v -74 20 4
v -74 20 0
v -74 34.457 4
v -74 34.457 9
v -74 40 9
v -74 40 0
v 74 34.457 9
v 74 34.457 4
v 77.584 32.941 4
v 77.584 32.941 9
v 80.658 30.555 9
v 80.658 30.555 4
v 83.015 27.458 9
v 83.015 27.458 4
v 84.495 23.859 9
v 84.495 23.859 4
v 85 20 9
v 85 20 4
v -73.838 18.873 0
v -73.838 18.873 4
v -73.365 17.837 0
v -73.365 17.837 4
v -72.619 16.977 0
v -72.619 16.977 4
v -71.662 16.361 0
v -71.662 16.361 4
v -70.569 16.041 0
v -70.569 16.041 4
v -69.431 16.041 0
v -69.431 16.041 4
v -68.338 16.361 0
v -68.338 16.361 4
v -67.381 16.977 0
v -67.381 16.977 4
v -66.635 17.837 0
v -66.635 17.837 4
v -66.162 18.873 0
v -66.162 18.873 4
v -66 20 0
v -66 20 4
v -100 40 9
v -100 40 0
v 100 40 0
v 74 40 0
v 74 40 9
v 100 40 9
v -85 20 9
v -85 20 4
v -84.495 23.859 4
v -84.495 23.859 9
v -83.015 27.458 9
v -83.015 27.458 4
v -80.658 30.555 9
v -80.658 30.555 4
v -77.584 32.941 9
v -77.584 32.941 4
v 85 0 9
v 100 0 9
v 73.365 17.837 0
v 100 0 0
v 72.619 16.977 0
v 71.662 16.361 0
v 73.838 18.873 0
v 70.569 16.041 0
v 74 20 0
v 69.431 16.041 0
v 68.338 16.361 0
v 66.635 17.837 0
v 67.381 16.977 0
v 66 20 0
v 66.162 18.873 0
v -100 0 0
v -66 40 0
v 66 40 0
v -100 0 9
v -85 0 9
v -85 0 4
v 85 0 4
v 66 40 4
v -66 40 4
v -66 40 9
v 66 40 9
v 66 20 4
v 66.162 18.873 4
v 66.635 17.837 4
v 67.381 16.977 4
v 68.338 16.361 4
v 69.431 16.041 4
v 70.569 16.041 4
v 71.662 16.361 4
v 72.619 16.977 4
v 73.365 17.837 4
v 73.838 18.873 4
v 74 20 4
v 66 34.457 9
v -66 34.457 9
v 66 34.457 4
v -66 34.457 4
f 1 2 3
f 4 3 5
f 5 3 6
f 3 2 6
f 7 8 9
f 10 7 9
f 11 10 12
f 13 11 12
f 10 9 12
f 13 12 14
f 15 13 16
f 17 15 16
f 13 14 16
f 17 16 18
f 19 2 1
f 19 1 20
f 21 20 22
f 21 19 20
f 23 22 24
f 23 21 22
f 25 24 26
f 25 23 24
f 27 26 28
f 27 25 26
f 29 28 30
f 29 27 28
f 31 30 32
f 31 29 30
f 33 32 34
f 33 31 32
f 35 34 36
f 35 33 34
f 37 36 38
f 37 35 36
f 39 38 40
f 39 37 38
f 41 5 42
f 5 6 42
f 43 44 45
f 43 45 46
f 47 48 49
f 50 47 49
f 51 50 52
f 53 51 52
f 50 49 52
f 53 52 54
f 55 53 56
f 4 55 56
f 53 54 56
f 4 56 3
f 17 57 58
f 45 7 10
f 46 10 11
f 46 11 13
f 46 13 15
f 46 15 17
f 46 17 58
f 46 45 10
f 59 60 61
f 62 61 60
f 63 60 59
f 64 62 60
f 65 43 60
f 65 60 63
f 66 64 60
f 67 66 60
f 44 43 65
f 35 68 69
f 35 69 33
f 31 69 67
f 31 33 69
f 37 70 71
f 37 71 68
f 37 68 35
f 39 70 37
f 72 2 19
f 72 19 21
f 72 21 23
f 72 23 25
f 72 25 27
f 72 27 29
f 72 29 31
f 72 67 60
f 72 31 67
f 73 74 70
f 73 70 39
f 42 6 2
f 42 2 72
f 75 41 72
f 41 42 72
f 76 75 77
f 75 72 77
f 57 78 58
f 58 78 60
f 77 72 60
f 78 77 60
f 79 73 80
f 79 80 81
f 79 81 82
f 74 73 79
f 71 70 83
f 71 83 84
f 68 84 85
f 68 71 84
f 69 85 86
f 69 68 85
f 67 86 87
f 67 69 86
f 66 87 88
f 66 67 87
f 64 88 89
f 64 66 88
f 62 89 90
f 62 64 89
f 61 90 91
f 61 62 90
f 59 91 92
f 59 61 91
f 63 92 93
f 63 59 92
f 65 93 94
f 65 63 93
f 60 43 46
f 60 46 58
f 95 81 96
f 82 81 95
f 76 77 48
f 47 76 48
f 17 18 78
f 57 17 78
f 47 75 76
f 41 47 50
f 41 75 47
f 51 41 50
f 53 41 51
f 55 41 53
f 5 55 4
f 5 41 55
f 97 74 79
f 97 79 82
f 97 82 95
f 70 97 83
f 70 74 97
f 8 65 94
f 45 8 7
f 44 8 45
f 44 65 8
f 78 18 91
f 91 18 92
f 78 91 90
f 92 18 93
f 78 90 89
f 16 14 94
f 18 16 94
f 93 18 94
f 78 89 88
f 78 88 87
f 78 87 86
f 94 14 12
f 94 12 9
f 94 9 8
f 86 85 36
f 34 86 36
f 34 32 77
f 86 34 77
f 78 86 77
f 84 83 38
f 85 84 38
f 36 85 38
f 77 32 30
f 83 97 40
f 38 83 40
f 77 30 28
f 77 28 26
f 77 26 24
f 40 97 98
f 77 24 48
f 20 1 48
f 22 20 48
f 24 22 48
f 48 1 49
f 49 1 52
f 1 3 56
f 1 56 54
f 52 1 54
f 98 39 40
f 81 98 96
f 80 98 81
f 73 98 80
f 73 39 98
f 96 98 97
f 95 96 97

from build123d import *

# Parameters (mm, degrees)
EXTRUDE_1_DEPTH = 4
SKETCH_2_W      = 132
SKETCH_2_H      = 5.543167705
EXTRUDE_2_DEPTH = 5


with BuildPart() as part:
    # 스케치1 → 보스-돌출1 (new body)
    with BuildSketch(Plane.XY):
        with BuildLine():
            Line((100, 0), (-100, 0))
            Line((-100, 0), (-100, 40))
            Line((-100, 40), (-74, 40))
            Line((-74, 40), (-74, 20))
            ThreePointArc((-74, 20), (-70, 16), (-66, 20))
            Line((-66, 20), (-66, 40))
            Line((-66, 40), (66, 40))
            Line((66, 40), (66, 20))
            ThreePointArc((66, 20), (70, 16), (74, 20))
            Line((74, 20), (74, 40))
            Line((74, 40), (100, 40))
            Line((100, 40), (100, 0))
        make_face()
    extrude(amount=EXTRUDE_1_DEPTH)

    # 스케치2 → 보스-돌출2 (add)
    with BuildSketch(Plane.XY.offset(4)):
        with BuildLine():
            Line((-74, 34.456832295), (-74, 40))
            Line((-74, 40), (-100, 40))
            Line((-100, 40), (-100, 0))
            Line((-100, 0), (-85, 0))
            Line((-85, 0), (-85, 20))
            ThreePointArc((-85, 20), (-81.937336386, 29.082951062), (-74, 34.456832295))
        make_face()
        with Locations((0, 37.228416147)):
            Rectangle(SKETCH_2_W, SKETCH_2_H)
        with BuildLine():
            Line((74, 40), (74, 34.456832295))
            ThreePointArc((74, 34.456832295), (81.937336386, 29.082951062), (85, 20))
            Line((85, 20), (85, 0))
            Line((85, 0), (100, 0))
            Line((100, 0), (100, 40))
            Line((100, 40), (74, 40))
        make_face()
    extrude(amount=EXTRUDE_2_DEPTH)


solid = part.part
